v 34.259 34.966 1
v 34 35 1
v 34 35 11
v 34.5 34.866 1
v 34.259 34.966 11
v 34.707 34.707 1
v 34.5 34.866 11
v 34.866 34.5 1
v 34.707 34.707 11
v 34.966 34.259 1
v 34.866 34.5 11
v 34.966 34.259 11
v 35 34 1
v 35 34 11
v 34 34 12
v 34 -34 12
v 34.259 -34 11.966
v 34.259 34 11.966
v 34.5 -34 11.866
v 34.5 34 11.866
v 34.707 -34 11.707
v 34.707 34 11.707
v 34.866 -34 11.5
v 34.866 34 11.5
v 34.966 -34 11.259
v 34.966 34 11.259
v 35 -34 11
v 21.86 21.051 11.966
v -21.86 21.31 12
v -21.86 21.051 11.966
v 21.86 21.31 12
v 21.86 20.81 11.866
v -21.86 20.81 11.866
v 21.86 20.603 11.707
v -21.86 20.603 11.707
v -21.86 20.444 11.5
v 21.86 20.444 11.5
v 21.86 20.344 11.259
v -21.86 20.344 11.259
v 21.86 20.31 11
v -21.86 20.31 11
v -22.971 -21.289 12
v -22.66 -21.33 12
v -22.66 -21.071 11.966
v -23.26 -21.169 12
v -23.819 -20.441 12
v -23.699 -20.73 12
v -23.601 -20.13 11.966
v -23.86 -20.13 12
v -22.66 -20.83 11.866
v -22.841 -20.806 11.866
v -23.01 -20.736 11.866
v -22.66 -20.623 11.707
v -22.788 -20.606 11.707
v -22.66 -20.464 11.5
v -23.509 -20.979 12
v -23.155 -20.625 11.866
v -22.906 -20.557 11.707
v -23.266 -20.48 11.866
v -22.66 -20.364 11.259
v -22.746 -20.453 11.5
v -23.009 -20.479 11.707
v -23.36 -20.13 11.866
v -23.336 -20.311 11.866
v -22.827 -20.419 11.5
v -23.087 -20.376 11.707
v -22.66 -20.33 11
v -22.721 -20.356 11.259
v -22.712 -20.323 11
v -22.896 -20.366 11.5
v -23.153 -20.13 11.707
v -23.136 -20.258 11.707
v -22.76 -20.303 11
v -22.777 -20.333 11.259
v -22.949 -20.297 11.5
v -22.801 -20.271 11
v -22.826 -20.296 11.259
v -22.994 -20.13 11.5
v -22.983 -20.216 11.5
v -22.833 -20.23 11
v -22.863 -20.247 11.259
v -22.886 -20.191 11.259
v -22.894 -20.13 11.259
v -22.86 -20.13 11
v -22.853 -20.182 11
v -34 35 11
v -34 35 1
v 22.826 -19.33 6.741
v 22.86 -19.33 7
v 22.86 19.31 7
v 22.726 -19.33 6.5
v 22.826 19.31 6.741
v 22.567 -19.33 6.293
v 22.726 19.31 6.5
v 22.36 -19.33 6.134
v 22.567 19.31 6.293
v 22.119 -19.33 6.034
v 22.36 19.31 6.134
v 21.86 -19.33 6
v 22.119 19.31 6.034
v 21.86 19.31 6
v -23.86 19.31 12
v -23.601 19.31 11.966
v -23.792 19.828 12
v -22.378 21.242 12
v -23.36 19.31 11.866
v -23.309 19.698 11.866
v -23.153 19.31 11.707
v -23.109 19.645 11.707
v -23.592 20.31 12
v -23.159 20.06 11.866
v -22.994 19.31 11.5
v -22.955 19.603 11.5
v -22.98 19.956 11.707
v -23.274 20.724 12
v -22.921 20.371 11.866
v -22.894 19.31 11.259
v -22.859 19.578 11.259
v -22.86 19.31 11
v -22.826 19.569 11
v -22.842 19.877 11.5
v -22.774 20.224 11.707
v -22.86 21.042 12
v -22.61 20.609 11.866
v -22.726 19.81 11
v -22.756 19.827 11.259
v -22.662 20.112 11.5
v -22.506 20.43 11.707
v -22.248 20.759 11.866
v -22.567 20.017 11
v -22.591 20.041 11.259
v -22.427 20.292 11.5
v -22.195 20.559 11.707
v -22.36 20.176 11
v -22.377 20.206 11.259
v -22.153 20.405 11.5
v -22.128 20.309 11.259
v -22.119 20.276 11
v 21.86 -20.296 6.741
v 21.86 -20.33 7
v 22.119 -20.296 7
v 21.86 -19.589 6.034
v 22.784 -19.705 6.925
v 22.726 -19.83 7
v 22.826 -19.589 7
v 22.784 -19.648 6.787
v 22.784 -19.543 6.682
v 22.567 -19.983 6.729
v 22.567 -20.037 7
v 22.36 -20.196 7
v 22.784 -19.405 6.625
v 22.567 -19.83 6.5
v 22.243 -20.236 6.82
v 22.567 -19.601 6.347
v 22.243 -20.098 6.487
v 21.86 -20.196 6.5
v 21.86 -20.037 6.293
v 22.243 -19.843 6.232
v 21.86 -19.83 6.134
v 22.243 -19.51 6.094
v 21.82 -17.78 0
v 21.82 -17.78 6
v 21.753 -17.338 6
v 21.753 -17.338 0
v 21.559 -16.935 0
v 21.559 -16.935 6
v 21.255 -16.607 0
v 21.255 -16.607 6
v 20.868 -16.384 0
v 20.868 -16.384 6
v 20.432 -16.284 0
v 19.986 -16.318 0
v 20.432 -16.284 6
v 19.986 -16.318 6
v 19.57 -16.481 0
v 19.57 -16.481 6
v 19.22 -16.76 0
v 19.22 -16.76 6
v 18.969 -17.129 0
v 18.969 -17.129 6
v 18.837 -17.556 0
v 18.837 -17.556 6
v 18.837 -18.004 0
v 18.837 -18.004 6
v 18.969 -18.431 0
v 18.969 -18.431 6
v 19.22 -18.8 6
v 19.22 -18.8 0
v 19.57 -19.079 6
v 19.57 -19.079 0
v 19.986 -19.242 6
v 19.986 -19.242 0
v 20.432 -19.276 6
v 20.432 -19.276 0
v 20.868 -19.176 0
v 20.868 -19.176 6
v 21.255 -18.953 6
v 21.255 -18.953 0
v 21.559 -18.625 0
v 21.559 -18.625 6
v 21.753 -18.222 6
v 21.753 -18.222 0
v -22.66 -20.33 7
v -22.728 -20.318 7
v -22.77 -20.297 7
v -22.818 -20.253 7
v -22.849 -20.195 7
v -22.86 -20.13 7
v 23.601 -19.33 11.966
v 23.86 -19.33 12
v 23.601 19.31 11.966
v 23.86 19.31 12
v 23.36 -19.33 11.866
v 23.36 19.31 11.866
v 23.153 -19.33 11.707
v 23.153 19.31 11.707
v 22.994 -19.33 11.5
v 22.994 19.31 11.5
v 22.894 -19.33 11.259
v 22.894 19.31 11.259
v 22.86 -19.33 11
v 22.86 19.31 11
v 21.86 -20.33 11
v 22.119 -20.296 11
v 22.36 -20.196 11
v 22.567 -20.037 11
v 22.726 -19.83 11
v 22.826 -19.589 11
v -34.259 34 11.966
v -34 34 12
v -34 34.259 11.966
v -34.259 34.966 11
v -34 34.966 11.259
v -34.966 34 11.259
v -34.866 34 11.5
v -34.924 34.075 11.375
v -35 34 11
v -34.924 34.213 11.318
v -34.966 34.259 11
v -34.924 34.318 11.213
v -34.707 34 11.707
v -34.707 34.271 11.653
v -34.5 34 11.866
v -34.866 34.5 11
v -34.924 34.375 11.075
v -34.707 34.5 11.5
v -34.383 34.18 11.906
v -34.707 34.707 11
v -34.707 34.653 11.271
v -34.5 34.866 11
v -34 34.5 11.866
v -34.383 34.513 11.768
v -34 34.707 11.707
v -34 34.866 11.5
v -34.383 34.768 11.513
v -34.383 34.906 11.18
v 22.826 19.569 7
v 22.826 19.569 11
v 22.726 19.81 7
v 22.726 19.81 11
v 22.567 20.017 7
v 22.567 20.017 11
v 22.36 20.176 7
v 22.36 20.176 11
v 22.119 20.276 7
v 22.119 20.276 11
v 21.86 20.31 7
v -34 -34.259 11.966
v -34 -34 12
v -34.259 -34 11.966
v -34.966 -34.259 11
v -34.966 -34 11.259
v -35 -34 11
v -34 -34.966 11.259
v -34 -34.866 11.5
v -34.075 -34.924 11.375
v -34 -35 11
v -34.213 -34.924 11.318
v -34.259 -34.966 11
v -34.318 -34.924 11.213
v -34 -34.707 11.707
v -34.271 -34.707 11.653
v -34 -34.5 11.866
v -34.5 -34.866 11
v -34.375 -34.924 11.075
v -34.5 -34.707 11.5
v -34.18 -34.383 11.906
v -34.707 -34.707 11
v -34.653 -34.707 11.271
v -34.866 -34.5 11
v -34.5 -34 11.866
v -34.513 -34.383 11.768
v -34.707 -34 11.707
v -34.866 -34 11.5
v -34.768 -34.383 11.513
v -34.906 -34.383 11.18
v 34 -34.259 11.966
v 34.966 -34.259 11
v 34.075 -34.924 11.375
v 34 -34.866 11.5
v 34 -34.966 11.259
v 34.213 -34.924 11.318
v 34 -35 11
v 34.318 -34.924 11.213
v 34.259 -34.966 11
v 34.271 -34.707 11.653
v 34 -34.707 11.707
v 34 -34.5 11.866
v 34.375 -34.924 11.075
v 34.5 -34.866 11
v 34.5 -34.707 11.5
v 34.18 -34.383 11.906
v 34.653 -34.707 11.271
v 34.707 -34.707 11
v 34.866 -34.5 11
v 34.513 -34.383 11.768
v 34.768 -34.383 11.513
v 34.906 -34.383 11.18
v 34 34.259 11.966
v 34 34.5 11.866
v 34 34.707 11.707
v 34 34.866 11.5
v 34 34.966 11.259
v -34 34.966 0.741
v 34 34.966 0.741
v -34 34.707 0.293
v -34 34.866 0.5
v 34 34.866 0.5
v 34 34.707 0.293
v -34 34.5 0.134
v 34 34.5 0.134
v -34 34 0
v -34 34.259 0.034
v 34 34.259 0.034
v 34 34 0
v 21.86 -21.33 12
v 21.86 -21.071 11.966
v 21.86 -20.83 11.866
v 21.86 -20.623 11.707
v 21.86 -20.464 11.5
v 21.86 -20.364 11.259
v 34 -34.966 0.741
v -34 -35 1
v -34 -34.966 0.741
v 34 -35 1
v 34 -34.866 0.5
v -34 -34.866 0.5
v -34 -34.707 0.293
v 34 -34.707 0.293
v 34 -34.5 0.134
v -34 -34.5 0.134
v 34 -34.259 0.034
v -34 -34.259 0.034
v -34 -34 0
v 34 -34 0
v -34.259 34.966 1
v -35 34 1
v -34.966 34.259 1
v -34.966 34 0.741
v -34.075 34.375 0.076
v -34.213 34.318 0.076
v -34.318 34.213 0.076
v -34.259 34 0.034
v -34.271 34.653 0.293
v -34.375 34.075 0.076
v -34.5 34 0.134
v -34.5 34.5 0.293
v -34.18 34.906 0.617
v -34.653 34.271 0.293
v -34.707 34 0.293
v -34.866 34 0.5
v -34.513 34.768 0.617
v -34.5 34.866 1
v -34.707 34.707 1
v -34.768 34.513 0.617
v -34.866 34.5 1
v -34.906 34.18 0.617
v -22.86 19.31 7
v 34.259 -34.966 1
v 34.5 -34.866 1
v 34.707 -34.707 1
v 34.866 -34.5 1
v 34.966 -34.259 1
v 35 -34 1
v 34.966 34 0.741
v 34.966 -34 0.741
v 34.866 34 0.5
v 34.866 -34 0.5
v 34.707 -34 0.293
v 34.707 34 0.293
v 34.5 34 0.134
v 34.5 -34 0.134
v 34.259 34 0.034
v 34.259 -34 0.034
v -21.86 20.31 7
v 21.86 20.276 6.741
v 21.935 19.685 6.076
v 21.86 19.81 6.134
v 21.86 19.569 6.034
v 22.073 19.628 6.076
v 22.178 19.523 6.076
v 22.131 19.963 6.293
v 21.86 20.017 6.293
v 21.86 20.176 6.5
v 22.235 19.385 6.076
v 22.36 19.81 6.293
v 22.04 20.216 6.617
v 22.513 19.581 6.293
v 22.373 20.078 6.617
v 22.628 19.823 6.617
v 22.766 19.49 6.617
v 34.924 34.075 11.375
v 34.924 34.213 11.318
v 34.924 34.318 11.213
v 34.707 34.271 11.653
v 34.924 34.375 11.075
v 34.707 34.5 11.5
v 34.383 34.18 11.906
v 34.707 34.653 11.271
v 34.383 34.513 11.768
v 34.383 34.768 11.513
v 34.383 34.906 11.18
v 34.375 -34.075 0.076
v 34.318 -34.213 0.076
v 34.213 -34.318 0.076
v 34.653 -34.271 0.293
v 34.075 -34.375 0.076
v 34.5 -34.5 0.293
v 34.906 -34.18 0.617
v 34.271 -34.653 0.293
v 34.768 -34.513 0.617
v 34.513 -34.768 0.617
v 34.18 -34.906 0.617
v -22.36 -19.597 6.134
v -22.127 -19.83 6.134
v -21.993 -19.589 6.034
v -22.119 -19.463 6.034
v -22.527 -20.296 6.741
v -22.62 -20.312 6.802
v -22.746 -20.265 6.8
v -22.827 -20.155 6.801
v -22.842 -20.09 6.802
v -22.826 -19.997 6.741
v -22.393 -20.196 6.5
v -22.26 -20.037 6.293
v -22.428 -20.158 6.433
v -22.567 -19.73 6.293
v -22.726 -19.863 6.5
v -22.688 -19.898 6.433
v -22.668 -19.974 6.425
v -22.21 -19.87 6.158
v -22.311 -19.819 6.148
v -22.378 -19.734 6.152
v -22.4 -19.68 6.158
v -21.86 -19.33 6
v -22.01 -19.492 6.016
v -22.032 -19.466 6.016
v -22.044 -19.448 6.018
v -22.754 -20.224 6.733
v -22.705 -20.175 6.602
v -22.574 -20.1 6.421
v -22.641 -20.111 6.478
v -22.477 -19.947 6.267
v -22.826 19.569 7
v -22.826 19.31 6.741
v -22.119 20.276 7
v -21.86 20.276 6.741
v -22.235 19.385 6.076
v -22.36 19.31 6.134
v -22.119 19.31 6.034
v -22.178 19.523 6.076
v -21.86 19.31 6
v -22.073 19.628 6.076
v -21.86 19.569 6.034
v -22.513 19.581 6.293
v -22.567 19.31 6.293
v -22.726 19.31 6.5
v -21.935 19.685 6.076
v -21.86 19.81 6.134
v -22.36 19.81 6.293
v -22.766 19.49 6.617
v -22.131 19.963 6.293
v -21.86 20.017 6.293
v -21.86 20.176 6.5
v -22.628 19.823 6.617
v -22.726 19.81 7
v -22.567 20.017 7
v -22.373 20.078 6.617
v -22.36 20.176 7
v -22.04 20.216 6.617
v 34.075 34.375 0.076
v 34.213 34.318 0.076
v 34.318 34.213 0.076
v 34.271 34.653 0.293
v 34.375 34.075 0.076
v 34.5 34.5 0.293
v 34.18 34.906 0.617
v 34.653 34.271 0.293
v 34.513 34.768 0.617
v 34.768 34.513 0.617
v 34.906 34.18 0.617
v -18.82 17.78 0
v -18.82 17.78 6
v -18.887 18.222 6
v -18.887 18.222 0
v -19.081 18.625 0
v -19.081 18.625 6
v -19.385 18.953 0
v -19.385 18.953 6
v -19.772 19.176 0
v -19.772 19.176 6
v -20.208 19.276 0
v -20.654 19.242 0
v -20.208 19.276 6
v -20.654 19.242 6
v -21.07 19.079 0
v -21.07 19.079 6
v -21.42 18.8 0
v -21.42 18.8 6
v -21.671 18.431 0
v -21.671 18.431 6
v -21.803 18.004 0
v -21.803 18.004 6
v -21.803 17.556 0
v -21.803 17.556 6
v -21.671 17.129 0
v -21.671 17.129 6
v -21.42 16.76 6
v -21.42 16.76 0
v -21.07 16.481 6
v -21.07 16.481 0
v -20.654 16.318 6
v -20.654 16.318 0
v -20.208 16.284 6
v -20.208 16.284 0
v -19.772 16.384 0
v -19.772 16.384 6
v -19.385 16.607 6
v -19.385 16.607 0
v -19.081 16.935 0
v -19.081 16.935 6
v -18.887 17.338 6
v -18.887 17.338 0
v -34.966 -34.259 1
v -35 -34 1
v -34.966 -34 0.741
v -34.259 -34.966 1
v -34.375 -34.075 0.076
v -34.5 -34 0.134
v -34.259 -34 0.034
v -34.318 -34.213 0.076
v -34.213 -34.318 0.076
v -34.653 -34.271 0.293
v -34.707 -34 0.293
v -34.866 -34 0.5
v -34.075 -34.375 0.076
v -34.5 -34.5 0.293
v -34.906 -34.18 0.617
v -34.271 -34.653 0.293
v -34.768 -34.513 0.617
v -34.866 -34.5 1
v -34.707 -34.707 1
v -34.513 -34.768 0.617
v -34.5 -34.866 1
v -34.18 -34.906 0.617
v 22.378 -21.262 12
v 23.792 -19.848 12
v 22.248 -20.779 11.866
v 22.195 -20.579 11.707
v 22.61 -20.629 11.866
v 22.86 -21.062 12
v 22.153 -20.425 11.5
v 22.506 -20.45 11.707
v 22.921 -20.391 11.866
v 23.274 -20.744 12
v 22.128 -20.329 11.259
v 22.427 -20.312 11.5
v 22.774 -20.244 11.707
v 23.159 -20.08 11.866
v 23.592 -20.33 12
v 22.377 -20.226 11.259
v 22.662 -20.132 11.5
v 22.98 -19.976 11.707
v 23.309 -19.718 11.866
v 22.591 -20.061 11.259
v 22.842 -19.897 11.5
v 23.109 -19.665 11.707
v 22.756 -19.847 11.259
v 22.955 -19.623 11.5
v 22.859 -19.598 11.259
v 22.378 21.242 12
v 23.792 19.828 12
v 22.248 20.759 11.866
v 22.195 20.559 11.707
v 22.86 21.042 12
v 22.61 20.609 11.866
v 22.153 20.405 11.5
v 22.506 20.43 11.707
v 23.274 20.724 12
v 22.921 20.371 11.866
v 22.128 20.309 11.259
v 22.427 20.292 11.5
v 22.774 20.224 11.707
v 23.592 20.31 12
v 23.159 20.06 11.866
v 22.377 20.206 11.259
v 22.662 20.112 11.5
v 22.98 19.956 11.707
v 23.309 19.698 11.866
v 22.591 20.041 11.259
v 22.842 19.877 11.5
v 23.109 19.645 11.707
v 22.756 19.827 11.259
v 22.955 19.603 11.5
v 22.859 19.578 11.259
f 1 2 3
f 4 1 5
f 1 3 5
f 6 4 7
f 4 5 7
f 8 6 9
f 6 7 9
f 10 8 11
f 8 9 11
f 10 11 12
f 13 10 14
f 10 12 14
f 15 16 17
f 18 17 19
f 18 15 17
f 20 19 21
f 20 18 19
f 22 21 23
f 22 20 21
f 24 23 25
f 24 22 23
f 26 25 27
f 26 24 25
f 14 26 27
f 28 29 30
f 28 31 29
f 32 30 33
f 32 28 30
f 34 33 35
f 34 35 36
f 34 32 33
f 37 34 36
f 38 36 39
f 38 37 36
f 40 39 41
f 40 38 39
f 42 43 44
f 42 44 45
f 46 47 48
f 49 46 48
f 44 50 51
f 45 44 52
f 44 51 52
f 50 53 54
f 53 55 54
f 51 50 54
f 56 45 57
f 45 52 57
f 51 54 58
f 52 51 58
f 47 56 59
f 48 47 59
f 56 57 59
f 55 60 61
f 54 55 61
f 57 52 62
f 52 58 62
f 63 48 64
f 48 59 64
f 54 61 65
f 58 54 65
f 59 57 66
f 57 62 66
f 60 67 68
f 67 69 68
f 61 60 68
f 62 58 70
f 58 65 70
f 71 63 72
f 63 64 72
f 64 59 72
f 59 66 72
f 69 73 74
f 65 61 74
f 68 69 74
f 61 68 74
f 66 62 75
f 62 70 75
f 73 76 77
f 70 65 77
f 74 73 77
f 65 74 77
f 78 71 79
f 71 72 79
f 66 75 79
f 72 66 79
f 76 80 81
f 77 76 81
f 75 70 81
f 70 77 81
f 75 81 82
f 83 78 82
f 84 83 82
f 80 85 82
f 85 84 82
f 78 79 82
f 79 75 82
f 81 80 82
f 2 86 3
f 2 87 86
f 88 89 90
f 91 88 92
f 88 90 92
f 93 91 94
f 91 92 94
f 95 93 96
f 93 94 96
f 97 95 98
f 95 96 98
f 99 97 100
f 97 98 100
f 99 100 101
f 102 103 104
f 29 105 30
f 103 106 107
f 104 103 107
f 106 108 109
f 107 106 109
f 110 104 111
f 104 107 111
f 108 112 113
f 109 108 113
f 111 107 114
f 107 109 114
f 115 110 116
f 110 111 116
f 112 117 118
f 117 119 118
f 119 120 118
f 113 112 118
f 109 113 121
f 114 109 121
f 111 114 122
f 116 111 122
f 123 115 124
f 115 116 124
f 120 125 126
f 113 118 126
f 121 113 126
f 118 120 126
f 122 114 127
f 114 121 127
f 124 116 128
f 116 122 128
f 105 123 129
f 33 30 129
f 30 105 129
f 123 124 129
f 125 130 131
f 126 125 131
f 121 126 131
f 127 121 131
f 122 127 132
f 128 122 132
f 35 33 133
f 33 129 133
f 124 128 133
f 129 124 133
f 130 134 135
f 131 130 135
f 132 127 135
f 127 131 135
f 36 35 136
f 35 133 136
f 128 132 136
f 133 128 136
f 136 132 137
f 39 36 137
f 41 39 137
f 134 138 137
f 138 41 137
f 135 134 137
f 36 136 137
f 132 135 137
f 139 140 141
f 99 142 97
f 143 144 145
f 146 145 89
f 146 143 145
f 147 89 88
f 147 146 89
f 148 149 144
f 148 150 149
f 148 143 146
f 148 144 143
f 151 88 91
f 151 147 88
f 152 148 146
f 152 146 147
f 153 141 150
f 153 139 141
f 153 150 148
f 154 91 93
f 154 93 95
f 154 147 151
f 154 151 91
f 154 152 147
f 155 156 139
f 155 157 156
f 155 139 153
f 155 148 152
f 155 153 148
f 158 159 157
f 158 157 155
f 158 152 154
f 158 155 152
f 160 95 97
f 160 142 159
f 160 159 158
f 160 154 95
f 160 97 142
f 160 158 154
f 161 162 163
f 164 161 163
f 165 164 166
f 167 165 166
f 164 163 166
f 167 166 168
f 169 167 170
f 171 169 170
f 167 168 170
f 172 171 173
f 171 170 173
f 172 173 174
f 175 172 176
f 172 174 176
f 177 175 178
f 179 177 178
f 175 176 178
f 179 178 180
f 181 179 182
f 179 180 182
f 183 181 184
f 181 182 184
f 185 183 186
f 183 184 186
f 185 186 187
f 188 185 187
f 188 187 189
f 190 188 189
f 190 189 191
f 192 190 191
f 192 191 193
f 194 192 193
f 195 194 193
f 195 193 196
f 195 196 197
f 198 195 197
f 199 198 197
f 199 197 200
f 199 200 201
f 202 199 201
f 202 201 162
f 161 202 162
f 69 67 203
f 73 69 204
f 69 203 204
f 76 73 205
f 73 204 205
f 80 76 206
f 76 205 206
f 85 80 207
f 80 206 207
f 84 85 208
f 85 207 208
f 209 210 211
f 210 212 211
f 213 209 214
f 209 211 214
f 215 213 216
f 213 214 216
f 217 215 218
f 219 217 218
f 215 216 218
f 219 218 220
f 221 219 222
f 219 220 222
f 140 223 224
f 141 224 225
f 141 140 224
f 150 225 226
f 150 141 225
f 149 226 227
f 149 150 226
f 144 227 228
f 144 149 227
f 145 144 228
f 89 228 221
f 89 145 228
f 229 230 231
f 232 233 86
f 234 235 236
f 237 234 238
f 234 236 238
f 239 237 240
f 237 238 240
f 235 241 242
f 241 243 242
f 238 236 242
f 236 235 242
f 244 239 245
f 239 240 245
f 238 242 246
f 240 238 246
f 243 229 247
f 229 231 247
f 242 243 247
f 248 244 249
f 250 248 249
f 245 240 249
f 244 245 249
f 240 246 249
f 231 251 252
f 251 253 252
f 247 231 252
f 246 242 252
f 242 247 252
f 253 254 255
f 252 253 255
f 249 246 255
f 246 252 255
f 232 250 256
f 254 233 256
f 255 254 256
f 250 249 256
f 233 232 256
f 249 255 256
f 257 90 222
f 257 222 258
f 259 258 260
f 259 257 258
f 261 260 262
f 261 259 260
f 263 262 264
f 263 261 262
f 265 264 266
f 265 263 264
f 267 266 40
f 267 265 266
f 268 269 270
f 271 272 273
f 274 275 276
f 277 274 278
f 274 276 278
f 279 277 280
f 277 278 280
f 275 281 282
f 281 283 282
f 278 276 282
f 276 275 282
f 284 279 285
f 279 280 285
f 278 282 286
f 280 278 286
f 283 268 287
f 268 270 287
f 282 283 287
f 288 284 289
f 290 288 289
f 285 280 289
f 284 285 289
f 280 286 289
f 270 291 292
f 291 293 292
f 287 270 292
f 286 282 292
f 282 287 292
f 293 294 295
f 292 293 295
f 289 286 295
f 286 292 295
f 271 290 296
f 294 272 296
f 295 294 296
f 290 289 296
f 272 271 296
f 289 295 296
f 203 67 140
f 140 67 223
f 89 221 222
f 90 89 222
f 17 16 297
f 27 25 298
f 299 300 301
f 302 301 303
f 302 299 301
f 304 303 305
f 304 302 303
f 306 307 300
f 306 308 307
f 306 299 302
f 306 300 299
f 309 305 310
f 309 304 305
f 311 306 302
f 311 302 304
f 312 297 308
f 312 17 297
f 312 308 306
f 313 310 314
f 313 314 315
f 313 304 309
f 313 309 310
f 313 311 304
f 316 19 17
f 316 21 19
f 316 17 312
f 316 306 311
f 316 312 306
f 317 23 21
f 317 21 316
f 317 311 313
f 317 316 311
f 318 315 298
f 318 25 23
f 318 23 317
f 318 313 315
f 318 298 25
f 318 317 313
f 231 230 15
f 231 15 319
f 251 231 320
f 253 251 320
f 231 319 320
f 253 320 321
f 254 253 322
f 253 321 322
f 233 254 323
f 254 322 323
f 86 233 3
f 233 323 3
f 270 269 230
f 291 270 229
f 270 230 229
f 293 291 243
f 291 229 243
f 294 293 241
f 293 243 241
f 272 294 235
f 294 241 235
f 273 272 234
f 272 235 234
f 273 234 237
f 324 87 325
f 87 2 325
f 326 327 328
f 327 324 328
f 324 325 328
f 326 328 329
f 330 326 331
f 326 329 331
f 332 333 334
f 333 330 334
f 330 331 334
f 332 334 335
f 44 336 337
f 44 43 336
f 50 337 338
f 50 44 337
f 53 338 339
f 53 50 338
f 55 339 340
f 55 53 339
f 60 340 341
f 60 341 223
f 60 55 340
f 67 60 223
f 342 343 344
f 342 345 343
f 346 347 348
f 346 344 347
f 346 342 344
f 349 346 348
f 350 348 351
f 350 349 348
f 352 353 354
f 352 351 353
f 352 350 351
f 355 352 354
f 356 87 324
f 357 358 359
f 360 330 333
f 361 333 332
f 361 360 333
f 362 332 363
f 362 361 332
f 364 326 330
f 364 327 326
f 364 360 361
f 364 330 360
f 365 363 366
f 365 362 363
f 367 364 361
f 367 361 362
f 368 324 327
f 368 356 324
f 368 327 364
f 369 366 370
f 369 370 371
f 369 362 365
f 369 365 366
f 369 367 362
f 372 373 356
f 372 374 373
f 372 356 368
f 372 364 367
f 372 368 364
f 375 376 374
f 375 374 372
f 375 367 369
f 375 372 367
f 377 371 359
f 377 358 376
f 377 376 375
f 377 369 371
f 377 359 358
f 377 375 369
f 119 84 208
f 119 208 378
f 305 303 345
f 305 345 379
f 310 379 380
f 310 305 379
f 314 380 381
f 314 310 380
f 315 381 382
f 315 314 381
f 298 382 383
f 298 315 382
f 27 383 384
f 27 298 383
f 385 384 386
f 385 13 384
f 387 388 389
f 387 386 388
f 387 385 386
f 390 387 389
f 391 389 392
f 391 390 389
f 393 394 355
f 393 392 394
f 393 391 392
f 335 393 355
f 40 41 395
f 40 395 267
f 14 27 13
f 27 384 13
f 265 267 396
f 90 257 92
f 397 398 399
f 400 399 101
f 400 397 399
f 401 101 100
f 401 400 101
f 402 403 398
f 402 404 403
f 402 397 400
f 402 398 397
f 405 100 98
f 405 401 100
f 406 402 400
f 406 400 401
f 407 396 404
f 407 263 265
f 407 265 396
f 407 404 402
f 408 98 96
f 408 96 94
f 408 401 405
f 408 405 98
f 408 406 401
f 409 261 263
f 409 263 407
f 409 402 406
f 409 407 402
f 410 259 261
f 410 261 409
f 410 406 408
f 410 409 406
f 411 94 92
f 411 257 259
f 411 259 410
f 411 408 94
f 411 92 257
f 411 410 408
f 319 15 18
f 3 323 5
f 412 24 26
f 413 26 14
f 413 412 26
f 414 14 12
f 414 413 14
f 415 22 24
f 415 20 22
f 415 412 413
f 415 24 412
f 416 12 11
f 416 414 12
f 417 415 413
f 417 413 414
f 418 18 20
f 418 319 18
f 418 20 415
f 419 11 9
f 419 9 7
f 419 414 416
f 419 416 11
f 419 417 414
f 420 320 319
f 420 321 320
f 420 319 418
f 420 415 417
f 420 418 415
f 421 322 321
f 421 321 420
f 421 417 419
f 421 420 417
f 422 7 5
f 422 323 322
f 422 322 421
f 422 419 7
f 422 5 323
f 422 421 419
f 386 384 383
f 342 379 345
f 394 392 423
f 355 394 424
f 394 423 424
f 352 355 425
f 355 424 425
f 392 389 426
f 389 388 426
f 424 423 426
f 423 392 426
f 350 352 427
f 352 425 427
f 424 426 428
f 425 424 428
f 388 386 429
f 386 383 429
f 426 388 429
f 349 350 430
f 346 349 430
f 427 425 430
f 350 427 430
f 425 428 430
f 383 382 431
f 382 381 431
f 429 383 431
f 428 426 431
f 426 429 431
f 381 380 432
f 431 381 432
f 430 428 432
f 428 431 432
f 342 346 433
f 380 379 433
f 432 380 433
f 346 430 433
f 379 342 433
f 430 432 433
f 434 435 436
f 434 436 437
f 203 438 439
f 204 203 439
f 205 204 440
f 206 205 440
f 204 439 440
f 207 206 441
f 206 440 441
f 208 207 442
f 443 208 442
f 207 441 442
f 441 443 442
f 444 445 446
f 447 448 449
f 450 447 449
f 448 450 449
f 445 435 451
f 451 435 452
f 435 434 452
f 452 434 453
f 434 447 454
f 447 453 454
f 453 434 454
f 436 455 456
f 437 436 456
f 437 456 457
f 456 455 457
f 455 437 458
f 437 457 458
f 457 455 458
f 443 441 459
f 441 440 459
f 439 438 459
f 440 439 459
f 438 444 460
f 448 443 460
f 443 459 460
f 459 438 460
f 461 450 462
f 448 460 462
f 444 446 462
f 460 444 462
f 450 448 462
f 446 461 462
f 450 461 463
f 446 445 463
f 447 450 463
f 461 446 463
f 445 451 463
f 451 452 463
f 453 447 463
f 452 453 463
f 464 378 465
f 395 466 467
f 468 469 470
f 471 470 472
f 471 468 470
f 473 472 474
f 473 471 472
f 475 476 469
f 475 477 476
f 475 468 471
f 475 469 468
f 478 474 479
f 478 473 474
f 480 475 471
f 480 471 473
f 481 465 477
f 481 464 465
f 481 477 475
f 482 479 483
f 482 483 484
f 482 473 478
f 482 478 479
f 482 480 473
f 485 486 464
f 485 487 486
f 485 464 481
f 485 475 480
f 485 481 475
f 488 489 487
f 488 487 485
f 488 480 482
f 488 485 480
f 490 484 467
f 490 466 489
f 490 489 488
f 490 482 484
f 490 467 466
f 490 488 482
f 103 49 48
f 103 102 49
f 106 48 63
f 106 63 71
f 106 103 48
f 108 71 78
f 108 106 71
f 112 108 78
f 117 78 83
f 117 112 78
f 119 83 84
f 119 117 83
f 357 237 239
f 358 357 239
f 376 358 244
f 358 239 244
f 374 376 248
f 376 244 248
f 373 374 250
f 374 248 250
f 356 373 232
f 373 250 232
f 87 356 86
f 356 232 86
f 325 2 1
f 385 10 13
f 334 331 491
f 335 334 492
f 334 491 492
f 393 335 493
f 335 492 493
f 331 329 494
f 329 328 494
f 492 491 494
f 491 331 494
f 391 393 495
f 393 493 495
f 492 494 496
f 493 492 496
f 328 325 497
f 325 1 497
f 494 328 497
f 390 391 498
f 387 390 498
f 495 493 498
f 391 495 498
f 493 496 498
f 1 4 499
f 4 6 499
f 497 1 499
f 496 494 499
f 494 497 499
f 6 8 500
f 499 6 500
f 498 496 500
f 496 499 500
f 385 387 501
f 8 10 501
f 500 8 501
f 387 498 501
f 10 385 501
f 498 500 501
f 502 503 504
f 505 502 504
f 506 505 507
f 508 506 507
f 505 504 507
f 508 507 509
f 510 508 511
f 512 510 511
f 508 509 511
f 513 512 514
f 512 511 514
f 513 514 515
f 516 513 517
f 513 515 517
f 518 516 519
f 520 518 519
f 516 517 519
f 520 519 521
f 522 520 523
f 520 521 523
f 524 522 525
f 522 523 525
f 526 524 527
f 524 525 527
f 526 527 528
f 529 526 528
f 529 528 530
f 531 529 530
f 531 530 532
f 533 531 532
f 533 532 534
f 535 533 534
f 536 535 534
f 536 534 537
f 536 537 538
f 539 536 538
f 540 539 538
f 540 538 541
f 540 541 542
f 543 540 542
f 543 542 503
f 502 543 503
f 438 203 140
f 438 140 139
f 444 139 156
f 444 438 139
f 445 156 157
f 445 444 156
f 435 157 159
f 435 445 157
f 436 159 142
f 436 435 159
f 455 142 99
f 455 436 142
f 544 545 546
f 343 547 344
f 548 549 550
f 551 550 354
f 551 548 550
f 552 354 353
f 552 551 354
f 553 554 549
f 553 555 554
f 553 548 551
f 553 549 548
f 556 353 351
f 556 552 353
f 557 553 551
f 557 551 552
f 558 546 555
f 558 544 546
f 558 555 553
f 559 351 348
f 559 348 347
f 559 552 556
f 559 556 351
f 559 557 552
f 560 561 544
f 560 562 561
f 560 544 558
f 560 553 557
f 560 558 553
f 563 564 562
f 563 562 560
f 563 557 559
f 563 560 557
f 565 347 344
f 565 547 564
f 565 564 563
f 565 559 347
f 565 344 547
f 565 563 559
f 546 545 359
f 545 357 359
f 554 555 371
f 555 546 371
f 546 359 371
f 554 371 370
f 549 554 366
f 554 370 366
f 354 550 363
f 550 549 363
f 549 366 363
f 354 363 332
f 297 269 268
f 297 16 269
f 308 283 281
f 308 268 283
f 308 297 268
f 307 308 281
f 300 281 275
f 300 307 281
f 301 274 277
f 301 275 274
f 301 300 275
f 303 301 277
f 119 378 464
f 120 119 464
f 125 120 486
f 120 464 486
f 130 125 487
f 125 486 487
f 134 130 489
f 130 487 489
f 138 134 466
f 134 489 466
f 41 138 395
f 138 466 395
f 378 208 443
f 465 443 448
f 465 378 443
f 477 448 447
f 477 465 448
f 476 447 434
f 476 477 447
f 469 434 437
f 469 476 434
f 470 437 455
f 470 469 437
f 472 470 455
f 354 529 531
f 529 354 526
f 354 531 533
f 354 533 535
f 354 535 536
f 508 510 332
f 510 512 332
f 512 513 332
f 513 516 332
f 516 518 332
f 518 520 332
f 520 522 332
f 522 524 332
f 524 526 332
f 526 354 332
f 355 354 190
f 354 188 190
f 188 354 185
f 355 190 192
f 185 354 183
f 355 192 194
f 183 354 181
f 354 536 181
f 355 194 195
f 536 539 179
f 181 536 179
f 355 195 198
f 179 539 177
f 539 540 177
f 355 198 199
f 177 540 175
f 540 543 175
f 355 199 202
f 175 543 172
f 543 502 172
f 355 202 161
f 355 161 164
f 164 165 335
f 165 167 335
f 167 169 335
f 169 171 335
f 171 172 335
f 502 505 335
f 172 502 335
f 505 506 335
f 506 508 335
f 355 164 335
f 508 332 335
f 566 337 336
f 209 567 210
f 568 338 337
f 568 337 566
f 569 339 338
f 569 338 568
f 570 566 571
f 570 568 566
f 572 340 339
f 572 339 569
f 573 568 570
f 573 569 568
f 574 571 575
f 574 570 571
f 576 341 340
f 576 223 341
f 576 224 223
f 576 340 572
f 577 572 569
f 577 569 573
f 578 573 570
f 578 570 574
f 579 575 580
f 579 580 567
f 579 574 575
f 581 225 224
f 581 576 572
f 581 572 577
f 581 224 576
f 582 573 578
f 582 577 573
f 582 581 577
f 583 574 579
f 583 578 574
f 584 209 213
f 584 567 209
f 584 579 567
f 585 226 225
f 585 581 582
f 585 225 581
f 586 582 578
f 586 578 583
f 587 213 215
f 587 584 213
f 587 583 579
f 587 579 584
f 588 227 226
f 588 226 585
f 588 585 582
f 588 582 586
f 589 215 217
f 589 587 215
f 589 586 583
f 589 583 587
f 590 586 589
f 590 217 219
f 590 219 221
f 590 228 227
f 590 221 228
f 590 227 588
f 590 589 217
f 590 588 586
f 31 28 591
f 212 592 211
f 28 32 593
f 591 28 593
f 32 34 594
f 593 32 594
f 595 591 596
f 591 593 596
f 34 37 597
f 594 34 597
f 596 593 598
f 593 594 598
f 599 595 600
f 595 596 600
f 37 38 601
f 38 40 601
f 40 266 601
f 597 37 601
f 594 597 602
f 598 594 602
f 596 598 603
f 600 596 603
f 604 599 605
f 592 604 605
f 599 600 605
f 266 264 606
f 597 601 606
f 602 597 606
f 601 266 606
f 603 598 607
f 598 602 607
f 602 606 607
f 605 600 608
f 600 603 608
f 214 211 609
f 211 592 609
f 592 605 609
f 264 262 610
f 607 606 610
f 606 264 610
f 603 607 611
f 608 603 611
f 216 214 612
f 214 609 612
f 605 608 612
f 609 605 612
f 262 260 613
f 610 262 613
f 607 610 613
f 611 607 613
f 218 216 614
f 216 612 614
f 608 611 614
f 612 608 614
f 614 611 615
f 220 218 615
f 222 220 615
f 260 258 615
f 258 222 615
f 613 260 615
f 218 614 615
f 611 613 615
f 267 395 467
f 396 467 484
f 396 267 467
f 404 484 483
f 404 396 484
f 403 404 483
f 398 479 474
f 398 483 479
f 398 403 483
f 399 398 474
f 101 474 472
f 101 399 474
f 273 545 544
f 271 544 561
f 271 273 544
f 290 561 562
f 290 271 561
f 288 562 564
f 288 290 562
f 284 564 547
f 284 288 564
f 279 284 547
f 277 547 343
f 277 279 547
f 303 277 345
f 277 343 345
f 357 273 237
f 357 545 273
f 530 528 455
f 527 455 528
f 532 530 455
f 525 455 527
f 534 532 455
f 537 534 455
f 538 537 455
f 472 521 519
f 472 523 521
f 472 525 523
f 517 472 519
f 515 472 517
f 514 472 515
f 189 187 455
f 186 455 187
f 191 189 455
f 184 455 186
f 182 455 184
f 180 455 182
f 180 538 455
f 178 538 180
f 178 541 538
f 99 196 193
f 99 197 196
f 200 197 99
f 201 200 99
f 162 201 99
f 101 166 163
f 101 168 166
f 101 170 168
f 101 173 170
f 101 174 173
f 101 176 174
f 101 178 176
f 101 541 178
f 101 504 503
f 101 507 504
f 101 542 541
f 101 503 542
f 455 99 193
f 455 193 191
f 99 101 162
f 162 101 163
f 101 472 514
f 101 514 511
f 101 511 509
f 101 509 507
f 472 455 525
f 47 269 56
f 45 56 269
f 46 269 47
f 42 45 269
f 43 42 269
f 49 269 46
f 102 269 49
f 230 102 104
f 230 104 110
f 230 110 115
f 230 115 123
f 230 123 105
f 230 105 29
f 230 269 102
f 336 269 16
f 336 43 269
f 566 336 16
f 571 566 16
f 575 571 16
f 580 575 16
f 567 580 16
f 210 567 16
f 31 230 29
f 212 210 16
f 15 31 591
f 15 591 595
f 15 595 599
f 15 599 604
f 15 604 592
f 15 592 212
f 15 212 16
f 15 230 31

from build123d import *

# Parameters (mm, degrees)
SKETCH_W     = 70
SKETCH_H     = 70
PAD_DEPTH    = 12
SKETCH001_W  = 45.72
SKETCH001_H  = 40.64
POCKET_DEPTH = 6
FILLET_R     = 0.2
FILLET001_R  = 1
SKETCH002_R  = 1.5
HOLE_DEPTH   = 25


with BuildPart() as part:
    # Sketch → Pad (new body)
    with BuildSketch(Plane.XY):
        Rectangle(SKETCH_W, SKETCH_H)
    extrude(amount=PAD_DEPTH)

    # Sketch001 (on Face6 of Pad) → Pocket (cut)
    with BuildSketch(Plane.XY.offset(12)):
        with Locations((0, -0.01)):
            Rectangle(SKETCH001_W, SKETCH001_H)
    extrude(amount=-POCKET_DEPTH, mode=Mode.SUBTRACT)

    # Fillet
    fillet_edges = [part.edges().sort_by_distance(p)[0] for p in [
        (-22.86, -20.33, 9),
    ]]
    fillet(fillet_edges, radius=FILLET_R)

    # Fillet001
    fillet001_edges = [part.edges().sort_by_distance(p)[0] for p in [
        (-22.86, 0.09, 12),
        (-22.801421, -20.271421, 12),
        (0, 20.31, 12),
        (0.1, -20.33, 12),
        (22.86, -0.01, 12),
        (0, 35, 12),
        (-35, 0, 12),
        (35, 0, 12),
        (0, -35, 12),
        (-22.86, -20.13, 9),
        (-22.86, 20.31, 9),
        (-22.86, 0.09, 6),
        (-22.66, -20.33, 9),
        (-22.801421, -20.271421, 6),
        (22.86, 20.31, 9),
        (0, 20.31, 6),
        (22.86, -20.33, 9),
        (0.1, -20.33, 6),
        (22.86, -0.01, 6),
        (-35, 35, 6),
        (35, 35, 6),
        (0, 35, 0),
        (-35, -35, 6),
        (-35, 0, 0),
        (35, -35, 6),
        (35, 0, 0),
        (0, -35, 0),
    ]]
    fillet(fillet001_edges, radius=FILLET001_R)

    # Sketch002 (on Face11 of Fillet) → Hole (cut)
    with BuildSketch(Plane.XY.offset(6)):
        with Locations((-20.32, 17.78)):
            Circle(SKETCH002_R)
        with Locations((20.32, -17.78)):
            Circle(SKETCH002_R)
    extrude(amount=-HOLE_DEPTH, mode=Mode.SUBTRACT)


solid = part.part
